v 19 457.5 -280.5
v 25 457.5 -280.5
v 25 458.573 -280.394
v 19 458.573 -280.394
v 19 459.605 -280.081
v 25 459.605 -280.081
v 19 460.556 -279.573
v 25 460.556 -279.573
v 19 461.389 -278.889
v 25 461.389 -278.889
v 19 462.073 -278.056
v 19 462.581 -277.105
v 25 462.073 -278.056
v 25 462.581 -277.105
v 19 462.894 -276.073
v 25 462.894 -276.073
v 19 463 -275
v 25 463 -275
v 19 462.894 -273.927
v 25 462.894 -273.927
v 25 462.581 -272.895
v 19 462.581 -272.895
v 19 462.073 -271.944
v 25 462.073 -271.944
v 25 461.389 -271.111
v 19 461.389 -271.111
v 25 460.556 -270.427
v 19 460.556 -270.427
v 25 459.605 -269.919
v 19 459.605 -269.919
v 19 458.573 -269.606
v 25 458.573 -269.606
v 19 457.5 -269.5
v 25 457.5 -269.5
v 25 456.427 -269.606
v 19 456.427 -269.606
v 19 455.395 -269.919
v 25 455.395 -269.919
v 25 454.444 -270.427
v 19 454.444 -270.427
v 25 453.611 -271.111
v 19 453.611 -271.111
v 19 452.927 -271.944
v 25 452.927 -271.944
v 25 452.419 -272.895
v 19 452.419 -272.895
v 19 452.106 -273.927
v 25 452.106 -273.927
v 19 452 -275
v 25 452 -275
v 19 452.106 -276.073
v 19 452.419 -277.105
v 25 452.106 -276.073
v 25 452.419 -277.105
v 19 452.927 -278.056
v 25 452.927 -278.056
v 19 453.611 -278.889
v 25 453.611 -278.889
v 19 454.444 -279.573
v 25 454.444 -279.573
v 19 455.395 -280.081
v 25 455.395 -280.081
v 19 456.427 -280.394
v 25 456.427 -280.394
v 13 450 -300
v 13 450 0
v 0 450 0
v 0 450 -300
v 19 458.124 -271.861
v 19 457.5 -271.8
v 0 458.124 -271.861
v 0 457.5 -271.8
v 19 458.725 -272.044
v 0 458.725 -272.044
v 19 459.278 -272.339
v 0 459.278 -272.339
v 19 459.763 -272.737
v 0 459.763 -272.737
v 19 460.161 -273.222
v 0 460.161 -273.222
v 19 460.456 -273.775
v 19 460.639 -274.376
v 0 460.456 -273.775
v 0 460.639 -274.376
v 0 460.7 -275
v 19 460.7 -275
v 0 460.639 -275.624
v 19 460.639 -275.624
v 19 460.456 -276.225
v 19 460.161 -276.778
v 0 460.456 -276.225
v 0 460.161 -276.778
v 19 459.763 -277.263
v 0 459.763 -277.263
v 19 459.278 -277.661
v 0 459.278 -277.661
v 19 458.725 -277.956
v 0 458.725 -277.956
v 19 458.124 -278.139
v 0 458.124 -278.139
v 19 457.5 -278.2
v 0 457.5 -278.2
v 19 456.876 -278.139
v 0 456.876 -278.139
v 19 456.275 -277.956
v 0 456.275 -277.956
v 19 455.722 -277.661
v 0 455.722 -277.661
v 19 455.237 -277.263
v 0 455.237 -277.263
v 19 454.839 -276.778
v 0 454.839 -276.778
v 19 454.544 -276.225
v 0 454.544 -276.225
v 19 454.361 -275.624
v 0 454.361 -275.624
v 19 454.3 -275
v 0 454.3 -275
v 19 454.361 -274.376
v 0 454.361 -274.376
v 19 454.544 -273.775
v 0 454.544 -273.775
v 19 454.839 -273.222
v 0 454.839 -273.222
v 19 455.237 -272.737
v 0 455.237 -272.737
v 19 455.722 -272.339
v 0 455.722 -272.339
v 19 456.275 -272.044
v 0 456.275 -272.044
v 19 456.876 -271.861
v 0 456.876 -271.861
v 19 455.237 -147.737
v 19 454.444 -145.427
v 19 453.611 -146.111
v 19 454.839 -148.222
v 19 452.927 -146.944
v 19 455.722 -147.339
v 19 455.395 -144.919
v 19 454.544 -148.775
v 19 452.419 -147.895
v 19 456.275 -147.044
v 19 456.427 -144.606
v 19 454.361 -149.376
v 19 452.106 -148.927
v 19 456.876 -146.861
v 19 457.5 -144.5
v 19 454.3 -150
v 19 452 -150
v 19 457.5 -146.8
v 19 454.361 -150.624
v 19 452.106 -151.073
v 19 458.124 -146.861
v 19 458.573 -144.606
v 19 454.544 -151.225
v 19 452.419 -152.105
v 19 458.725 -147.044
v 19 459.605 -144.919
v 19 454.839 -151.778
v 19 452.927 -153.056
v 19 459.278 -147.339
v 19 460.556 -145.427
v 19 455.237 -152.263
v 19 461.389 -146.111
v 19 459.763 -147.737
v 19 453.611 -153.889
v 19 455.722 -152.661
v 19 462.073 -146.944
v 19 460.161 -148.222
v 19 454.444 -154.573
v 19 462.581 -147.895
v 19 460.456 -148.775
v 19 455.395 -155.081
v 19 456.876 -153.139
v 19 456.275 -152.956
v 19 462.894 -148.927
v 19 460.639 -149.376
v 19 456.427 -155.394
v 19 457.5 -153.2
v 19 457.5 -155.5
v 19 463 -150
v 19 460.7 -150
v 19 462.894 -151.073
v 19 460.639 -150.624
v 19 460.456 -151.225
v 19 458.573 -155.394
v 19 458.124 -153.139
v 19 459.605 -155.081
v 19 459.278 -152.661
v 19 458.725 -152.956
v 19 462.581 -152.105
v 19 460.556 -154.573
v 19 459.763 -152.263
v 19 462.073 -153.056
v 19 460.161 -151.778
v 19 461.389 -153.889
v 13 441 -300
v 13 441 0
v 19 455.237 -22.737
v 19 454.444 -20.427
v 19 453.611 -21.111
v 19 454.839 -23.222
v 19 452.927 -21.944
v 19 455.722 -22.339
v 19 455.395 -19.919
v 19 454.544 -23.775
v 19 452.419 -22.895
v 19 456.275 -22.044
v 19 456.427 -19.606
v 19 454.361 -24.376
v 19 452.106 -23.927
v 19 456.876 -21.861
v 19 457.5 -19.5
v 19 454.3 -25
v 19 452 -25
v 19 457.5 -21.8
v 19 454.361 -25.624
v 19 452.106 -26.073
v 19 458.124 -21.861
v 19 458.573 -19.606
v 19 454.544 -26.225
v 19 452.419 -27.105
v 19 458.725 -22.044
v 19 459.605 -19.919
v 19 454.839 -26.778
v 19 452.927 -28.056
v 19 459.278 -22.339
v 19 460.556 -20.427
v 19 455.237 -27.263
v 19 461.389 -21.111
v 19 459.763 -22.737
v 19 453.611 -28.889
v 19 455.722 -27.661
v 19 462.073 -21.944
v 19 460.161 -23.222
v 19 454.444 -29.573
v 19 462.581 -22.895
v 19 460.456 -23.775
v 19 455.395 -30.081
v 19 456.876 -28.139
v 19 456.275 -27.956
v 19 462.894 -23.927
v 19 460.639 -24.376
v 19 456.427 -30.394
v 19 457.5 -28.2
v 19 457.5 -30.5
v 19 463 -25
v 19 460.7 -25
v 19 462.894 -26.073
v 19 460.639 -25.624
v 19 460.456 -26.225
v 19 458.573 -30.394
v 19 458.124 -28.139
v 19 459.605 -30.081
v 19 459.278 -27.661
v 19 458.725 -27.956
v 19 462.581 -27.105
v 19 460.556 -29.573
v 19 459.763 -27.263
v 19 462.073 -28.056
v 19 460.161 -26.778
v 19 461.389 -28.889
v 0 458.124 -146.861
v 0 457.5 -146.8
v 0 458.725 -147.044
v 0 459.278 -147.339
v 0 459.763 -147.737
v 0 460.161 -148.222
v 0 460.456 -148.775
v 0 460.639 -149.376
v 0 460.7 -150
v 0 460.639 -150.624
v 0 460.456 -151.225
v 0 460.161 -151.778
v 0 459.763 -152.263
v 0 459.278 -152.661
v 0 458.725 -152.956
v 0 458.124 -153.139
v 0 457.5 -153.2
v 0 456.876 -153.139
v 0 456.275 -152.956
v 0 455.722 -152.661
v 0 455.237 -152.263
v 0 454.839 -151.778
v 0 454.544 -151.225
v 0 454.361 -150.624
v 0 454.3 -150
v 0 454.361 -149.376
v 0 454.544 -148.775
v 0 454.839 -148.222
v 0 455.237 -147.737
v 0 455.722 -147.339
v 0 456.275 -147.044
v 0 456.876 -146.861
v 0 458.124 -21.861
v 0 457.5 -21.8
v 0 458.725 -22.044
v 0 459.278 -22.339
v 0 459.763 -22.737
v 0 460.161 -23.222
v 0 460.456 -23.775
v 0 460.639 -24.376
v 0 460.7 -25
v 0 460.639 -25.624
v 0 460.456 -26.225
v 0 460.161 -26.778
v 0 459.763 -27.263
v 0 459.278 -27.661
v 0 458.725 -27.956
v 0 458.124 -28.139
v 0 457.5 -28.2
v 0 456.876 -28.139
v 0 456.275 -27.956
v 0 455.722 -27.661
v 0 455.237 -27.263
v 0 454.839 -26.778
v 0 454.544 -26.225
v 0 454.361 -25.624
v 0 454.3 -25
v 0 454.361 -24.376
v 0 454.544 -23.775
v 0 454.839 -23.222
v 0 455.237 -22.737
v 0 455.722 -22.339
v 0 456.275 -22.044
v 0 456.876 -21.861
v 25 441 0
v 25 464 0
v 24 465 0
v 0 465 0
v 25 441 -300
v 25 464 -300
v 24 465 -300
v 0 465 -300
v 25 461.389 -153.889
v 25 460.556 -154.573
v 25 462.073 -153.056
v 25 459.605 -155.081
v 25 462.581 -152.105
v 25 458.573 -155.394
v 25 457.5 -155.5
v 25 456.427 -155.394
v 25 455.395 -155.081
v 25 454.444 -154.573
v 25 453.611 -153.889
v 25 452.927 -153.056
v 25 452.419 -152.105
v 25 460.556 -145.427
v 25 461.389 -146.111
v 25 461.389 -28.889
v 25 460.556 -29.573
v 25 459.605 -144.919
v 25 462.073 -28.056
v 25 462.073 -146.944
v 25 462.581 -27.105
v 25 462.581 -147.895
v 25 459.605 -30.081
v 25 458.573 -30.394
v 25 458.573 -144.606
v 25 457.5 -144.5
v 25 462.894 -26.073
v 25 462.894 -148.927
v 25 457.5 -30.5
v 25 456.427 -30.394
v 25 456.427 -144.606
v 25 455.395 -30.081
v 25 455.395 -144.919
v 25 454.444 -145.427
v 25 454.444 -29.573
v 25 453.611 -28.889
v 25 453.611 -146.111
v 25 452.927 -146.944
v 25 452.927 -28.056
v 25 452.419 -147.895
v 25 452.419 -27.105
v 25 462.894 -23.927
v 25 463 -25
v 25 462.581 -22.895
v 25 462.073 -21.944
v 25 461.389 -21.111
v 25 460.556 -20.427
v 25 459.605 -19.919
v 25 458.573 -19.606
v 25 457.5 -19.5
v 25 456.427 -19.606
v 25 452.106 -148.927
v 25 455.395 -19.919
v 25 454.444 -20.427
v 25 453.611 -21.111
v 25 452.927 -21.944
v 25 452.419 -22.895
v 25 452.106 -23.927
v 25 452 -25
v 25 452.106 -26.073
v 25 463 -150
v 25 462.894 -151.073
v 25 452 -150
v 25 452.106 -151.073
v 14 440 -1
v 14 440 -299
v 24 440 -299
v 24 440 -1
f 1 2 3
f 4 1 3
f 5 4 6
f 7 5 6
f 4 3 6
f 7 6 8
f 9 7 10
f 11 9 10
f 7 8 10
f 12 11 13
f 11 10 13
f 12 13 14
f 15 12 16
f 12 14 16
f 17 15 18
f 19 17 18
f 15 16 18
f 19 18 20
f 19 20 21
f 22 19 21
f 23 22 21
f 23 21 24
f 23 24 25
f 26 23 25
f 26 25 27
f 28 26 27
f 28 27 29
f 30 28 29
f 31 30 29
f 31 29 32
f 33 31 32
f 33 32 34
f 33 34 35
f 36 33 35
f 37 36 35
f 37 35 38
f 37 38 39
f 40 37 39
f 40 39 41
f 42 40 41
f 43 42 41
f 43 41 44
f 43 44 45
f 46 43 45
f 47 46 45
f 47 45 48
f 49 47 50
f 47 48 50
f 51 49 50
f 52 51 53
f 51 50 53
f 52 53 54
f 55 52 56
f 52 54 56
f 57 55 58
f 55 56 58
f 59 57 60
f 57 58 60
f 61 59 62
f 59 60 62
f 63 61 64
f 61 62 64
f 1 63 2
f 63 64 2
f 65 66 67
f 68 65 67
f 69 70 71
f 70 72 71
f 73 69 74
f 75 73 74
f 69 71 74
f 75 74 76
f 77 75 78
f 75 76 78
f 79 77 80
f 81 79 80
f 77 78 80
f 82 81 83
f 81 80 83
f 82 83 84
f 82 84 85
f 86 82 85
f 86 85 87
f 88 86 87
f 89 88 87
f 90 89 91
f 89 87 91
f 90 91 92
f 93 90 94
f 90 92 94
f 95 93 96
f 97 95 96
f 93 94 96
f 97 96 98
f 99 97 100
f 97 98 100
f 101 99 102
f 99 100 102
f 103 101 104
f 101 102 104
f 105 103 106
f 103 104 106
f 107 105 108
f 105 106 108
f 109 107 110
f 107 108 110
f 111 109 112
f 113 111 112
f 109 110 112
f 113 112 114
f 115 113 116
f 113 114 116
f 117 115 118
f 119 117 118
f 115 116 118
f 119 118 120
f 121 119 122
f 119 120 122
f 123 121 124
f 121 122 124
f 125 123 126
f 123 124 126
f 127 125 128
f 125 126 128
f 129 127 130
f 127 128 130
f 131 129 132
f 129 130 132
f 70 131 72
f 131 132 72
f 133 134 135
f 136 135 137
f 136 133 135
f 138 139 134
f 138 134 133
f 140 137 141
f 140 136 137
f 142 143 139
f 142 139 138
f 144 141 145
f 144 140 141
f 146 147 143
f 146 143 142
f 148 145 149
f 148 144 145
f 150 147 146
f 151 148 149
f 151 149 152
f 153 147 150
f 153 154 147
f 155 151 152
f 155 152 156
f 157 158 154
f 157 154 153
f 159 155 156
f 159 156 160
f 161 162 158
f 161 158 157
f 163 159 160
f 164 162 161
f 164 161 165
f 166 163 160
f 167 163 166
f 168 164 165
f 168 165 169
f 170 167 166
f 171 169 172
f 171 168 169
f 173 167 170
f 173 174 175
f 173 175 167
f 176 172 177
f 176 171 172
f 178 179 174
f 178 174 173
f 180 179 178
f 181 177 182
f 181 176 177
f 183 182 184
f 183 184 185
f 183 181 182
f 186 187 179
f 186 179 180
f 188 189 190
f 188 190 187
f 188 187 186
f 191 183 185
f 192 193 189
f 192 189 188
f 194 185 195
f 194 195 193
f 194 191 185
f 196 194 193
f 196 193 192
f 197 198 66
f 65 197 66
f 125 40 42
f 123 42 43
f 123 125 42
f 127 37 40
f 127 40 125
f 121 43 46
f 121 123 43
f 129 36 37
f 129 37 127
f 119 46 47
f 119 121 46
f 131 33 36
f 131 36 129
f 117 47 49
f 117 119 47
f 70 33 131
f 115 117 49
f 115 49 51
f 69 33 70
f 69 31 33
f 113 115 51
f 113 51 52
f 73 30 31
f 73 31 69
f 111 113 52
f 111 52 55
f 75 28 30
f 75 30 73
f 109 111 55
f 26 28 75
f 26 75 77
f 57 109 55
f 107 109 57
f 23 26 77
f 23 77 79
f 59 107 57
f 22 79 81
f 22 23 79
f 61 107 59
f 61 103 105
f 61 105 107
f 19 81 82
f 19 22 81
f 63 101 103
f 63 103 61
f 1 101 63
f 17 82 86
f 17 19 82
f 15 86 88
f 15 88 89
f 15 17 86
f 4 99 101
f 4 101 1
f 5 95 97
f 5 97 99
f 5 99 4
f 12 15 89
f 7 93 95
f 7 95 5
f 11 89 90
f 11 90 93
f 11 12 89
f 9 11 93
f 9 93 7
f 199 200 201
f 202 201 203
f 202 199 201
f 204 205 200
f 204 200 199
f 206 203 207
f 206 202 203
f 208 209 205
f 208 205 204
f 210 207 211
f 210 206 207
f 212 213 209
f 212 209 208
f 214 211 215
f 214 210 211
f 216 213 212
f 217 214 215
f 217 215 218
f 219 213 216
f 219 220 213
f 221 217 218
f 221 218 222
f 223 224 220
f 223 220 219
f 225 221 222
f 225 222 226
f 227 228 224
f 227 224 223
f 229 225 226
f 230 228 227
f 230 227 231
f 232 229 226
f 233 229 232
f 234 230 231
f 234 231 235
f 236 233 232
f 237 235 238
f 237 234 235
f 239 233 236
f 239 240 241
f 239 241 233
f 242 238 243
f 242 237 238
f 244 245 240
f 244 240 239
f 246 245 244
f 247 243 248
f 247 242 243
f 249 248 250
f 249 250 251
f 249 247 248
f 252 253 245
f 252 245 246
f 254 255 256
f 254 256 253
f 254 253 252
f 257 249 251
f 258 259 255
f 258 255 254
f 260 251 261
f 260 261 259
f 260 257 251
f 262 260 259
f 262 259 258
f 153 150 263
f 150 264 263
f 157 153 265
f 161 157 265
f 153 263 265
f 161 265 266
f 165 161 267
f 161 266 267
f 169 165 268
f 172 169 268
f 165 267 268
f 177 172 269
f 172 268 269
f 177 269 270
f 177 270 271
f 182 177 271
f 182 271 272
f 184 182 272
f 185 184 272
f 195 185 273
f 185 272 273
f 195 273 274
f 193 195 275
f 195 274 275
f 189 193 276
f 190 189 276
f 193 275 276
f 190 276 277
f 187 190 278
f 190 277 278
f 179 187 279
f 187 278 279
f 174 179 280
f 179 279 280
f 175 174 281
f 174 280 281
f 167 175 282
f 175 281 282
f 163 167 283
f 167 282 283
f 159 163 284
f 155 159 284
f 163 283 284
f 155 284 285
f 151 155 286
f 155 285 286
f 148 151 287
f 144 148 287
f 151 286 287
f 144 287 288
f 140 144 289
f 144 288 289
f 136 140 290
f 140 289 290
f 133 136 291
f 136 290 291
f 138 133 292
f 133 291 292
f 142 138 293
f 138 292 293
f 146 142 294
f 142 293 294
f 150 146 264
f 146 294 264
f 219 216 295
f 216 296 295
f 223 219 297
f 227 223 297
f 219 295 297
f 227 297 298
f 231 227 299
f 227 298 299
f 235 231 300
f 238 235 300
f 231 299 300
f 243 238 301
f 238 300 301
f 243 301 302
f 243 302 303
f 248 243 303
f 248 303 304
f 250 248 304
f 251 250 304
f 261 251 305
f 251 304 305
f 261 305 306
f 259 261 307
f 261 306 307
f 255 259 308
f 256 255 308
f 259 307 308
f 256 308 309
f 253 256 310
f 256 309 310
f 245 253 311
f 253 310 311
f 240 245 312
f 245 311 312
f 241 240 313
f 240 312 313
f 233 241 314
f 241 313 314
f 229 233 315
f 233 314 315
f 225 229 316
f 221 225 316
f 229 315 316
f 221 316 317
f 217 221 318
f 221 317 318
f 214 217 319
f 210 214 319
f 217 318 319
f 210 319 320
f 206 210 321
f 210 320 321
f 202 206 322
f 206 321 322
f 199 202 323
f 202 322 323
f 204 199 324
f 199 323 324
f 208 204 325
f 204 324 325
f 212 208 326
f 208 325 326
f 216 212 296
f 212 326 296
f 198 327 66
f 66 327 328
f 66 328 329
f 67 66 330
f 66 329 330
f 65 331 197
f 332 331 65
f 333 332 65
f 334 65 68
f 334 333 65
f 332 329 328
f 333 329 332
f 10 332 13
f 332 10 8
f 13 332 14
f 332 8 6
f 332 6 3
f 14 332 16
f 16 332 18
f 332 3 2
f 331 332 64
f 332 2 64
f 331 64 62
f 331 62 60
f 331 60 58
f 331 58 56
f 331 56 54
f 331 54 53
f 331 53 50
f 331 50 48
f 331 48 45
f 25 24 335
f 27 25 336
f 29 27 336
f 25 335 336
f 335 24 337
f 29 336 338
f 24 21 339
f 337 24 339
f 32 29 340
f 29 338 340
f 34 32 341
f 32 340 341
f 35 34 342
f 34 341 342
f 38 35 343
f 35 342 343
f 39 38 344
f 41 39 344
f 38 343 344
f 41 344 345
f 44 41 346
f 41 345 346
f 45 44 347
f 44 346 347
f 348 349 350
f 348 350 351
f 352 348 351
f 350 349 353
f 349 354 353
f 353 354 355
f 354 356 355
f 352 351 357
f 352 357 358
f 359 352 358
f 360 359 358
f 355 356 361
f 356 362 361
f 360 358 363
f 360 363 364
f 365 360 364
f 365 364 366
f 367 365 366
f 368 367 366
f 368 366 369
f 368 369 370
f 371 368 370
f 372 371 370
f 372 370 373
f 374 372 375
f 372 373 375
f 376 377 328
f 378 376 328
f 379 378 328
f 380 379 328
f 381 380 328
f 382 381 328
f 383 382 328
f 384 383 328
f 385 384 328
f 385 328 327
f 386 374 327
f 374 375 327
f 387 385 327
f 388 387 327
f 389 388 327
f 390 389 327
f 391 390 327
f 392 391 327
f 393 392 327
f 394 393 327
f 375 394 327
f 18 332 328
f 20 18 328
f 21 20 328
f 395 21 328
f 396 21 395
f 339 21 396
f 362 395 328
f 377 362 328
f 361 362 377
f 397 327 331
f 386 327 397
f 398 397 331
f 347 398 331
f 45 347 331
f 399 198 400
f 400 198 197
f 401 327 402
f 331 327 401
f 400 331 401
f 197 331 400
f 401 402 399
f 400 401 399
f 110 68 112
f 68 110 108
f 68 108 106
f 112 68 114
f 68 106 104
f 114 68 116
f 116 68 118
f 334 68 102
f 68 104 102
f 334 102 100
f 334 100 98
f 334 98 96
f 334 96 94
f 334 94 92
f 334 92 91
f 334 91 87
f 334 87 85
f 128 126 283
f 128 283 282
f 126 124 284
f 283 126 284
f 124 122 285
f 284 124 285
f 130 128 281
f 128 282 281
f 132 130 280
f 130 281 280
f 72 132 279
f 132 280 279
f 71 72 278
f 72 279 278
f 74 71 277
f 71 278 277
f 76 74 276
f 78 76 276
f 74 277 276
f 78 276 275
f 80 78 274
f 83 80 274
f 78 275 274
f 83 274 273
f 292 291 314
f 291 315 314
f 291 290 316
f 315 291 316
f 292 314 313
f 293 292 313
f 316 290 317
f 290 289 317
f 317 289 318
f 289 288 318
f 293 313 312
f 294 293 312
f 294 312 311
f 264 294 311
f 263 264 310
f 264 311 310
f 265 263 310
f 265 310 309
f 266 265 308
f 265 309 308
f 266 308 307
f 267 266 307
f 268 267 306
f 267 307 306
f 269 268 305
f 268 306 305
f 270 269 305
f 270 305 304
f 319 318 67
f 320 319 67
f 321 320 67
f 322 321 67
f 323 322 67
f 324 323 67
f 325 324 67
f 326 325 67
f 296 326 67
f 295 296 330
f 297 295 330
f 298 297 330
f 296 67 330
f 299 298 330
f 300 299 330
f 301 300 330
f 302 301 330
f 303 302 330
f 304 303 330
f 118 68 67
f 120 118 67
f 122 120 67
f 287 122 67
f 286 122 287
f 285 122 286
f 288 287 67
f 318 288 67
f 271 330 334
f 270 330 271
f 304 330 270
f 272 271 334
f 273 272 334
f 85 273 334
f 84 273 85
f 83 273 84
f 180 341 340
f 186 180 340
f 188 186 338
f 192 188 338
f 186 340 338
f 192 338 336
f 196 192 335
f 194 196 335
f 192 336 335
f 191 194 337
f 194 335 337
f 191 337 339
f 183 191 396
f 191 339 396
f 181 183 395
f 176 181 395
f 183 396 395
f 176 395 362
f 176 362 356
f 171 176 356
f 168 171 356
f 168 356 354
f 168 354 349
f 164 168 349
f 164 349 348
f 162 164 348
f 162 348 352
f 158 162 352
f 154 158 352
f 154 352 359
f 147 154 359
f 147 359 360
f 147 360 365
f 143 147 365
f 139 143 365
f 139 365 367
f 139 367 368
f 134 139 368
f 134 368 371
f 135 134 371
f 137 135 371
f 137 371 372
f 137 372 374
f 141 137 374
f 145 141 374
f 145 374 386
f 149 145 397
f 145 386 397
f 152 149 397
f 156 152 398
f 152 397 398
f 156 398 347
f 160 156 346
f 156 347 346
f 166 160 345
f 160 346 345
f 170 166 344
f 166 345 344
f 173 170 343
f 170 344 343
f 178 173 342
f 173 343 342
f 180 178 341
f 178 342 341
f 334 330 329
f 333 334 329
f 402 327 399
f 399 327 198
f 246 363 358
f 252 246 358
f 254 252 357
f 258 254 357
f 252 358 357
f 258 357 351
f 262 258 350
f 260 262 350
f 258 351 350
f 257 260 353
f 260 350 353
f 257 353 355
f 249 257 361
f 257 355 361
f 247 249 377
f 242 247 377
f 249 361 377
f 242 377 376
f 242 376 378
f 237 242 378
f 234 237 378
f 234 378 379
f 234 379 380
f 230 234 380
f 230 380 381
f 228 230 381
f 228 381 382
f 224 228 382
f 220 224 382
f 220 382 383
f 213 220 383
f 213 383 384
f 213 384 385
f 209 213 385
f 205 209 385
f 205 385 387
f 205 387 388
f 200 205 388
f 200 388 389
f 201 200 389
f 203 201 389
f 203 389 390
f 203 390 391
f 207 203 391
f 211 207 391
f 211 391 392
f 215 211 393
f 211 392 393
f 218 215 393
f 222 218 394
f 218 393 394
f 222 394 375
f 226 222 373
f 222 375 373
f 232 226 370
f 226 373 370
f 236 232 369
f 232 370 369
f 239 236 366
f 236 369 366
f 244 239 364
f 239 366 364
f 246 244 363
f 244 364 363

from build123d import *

# Parameters (mm, degrees)
EXTRUDE_1_DEPTH              = 300
HOLE_WIZARD_M6_1_D           = 6.4
HOLE_WIZARD_M6_1_CBORE_D     = 11
HOLE_WIZARD_M6_1_CBORE_DEPTH = 6
CHAMFER_1_SIZE               = 1
CHAMFER_2_SIZE               = 1


with BuildPart() as part:
    # 草图1 → 凸台-拉伸1 (new body)
    with BuildSketch(Plane.XY):
        Polygon((25, 440), (13, 440), (13, 450), (0, 450), (0, 465), (25, 465), align=None)
    extrude(amount=-EXTRUDE_1_DEPTH)

    # M6 凹头盖螺钉的柱形沉头孔1 (through all)
    with Locations(Plane(origin=(25, 0, 0), x_dir=(0, 0, -1), z_dir=(1, 0, 0))):
        with Locations((25, 457.5), (275, 457.5), (150, 457.5)):
            CounterBoreHole(HOLE_WIZARD_M6_1_D / 2, HOLE_WIZARD_M6_1_CBORE_D / 2, HOLE_WIZARD_M6_1_CBORE_DEPTH)

    # 倒角1
    chamfer_1_edges = [part.edges().sort_by_distance(p)[0] for p in [
        (25, 440, -150),
        (13, 440, -150),
        (19, 440, -300),
        (19, 440, 0),
    ]]
    chamfer(chamfer_1_edges, length=CHAMFER_1_SIZE)

    # 倒角2
    chamfer_2_edges = [part.edges().sort_by_distance(p)[0] for p in [
        (25, 465, -150),
    ]]
    chamfer(chamfer_2_edges, length=CHAMFER_2_SIZE)


solid = part.part
